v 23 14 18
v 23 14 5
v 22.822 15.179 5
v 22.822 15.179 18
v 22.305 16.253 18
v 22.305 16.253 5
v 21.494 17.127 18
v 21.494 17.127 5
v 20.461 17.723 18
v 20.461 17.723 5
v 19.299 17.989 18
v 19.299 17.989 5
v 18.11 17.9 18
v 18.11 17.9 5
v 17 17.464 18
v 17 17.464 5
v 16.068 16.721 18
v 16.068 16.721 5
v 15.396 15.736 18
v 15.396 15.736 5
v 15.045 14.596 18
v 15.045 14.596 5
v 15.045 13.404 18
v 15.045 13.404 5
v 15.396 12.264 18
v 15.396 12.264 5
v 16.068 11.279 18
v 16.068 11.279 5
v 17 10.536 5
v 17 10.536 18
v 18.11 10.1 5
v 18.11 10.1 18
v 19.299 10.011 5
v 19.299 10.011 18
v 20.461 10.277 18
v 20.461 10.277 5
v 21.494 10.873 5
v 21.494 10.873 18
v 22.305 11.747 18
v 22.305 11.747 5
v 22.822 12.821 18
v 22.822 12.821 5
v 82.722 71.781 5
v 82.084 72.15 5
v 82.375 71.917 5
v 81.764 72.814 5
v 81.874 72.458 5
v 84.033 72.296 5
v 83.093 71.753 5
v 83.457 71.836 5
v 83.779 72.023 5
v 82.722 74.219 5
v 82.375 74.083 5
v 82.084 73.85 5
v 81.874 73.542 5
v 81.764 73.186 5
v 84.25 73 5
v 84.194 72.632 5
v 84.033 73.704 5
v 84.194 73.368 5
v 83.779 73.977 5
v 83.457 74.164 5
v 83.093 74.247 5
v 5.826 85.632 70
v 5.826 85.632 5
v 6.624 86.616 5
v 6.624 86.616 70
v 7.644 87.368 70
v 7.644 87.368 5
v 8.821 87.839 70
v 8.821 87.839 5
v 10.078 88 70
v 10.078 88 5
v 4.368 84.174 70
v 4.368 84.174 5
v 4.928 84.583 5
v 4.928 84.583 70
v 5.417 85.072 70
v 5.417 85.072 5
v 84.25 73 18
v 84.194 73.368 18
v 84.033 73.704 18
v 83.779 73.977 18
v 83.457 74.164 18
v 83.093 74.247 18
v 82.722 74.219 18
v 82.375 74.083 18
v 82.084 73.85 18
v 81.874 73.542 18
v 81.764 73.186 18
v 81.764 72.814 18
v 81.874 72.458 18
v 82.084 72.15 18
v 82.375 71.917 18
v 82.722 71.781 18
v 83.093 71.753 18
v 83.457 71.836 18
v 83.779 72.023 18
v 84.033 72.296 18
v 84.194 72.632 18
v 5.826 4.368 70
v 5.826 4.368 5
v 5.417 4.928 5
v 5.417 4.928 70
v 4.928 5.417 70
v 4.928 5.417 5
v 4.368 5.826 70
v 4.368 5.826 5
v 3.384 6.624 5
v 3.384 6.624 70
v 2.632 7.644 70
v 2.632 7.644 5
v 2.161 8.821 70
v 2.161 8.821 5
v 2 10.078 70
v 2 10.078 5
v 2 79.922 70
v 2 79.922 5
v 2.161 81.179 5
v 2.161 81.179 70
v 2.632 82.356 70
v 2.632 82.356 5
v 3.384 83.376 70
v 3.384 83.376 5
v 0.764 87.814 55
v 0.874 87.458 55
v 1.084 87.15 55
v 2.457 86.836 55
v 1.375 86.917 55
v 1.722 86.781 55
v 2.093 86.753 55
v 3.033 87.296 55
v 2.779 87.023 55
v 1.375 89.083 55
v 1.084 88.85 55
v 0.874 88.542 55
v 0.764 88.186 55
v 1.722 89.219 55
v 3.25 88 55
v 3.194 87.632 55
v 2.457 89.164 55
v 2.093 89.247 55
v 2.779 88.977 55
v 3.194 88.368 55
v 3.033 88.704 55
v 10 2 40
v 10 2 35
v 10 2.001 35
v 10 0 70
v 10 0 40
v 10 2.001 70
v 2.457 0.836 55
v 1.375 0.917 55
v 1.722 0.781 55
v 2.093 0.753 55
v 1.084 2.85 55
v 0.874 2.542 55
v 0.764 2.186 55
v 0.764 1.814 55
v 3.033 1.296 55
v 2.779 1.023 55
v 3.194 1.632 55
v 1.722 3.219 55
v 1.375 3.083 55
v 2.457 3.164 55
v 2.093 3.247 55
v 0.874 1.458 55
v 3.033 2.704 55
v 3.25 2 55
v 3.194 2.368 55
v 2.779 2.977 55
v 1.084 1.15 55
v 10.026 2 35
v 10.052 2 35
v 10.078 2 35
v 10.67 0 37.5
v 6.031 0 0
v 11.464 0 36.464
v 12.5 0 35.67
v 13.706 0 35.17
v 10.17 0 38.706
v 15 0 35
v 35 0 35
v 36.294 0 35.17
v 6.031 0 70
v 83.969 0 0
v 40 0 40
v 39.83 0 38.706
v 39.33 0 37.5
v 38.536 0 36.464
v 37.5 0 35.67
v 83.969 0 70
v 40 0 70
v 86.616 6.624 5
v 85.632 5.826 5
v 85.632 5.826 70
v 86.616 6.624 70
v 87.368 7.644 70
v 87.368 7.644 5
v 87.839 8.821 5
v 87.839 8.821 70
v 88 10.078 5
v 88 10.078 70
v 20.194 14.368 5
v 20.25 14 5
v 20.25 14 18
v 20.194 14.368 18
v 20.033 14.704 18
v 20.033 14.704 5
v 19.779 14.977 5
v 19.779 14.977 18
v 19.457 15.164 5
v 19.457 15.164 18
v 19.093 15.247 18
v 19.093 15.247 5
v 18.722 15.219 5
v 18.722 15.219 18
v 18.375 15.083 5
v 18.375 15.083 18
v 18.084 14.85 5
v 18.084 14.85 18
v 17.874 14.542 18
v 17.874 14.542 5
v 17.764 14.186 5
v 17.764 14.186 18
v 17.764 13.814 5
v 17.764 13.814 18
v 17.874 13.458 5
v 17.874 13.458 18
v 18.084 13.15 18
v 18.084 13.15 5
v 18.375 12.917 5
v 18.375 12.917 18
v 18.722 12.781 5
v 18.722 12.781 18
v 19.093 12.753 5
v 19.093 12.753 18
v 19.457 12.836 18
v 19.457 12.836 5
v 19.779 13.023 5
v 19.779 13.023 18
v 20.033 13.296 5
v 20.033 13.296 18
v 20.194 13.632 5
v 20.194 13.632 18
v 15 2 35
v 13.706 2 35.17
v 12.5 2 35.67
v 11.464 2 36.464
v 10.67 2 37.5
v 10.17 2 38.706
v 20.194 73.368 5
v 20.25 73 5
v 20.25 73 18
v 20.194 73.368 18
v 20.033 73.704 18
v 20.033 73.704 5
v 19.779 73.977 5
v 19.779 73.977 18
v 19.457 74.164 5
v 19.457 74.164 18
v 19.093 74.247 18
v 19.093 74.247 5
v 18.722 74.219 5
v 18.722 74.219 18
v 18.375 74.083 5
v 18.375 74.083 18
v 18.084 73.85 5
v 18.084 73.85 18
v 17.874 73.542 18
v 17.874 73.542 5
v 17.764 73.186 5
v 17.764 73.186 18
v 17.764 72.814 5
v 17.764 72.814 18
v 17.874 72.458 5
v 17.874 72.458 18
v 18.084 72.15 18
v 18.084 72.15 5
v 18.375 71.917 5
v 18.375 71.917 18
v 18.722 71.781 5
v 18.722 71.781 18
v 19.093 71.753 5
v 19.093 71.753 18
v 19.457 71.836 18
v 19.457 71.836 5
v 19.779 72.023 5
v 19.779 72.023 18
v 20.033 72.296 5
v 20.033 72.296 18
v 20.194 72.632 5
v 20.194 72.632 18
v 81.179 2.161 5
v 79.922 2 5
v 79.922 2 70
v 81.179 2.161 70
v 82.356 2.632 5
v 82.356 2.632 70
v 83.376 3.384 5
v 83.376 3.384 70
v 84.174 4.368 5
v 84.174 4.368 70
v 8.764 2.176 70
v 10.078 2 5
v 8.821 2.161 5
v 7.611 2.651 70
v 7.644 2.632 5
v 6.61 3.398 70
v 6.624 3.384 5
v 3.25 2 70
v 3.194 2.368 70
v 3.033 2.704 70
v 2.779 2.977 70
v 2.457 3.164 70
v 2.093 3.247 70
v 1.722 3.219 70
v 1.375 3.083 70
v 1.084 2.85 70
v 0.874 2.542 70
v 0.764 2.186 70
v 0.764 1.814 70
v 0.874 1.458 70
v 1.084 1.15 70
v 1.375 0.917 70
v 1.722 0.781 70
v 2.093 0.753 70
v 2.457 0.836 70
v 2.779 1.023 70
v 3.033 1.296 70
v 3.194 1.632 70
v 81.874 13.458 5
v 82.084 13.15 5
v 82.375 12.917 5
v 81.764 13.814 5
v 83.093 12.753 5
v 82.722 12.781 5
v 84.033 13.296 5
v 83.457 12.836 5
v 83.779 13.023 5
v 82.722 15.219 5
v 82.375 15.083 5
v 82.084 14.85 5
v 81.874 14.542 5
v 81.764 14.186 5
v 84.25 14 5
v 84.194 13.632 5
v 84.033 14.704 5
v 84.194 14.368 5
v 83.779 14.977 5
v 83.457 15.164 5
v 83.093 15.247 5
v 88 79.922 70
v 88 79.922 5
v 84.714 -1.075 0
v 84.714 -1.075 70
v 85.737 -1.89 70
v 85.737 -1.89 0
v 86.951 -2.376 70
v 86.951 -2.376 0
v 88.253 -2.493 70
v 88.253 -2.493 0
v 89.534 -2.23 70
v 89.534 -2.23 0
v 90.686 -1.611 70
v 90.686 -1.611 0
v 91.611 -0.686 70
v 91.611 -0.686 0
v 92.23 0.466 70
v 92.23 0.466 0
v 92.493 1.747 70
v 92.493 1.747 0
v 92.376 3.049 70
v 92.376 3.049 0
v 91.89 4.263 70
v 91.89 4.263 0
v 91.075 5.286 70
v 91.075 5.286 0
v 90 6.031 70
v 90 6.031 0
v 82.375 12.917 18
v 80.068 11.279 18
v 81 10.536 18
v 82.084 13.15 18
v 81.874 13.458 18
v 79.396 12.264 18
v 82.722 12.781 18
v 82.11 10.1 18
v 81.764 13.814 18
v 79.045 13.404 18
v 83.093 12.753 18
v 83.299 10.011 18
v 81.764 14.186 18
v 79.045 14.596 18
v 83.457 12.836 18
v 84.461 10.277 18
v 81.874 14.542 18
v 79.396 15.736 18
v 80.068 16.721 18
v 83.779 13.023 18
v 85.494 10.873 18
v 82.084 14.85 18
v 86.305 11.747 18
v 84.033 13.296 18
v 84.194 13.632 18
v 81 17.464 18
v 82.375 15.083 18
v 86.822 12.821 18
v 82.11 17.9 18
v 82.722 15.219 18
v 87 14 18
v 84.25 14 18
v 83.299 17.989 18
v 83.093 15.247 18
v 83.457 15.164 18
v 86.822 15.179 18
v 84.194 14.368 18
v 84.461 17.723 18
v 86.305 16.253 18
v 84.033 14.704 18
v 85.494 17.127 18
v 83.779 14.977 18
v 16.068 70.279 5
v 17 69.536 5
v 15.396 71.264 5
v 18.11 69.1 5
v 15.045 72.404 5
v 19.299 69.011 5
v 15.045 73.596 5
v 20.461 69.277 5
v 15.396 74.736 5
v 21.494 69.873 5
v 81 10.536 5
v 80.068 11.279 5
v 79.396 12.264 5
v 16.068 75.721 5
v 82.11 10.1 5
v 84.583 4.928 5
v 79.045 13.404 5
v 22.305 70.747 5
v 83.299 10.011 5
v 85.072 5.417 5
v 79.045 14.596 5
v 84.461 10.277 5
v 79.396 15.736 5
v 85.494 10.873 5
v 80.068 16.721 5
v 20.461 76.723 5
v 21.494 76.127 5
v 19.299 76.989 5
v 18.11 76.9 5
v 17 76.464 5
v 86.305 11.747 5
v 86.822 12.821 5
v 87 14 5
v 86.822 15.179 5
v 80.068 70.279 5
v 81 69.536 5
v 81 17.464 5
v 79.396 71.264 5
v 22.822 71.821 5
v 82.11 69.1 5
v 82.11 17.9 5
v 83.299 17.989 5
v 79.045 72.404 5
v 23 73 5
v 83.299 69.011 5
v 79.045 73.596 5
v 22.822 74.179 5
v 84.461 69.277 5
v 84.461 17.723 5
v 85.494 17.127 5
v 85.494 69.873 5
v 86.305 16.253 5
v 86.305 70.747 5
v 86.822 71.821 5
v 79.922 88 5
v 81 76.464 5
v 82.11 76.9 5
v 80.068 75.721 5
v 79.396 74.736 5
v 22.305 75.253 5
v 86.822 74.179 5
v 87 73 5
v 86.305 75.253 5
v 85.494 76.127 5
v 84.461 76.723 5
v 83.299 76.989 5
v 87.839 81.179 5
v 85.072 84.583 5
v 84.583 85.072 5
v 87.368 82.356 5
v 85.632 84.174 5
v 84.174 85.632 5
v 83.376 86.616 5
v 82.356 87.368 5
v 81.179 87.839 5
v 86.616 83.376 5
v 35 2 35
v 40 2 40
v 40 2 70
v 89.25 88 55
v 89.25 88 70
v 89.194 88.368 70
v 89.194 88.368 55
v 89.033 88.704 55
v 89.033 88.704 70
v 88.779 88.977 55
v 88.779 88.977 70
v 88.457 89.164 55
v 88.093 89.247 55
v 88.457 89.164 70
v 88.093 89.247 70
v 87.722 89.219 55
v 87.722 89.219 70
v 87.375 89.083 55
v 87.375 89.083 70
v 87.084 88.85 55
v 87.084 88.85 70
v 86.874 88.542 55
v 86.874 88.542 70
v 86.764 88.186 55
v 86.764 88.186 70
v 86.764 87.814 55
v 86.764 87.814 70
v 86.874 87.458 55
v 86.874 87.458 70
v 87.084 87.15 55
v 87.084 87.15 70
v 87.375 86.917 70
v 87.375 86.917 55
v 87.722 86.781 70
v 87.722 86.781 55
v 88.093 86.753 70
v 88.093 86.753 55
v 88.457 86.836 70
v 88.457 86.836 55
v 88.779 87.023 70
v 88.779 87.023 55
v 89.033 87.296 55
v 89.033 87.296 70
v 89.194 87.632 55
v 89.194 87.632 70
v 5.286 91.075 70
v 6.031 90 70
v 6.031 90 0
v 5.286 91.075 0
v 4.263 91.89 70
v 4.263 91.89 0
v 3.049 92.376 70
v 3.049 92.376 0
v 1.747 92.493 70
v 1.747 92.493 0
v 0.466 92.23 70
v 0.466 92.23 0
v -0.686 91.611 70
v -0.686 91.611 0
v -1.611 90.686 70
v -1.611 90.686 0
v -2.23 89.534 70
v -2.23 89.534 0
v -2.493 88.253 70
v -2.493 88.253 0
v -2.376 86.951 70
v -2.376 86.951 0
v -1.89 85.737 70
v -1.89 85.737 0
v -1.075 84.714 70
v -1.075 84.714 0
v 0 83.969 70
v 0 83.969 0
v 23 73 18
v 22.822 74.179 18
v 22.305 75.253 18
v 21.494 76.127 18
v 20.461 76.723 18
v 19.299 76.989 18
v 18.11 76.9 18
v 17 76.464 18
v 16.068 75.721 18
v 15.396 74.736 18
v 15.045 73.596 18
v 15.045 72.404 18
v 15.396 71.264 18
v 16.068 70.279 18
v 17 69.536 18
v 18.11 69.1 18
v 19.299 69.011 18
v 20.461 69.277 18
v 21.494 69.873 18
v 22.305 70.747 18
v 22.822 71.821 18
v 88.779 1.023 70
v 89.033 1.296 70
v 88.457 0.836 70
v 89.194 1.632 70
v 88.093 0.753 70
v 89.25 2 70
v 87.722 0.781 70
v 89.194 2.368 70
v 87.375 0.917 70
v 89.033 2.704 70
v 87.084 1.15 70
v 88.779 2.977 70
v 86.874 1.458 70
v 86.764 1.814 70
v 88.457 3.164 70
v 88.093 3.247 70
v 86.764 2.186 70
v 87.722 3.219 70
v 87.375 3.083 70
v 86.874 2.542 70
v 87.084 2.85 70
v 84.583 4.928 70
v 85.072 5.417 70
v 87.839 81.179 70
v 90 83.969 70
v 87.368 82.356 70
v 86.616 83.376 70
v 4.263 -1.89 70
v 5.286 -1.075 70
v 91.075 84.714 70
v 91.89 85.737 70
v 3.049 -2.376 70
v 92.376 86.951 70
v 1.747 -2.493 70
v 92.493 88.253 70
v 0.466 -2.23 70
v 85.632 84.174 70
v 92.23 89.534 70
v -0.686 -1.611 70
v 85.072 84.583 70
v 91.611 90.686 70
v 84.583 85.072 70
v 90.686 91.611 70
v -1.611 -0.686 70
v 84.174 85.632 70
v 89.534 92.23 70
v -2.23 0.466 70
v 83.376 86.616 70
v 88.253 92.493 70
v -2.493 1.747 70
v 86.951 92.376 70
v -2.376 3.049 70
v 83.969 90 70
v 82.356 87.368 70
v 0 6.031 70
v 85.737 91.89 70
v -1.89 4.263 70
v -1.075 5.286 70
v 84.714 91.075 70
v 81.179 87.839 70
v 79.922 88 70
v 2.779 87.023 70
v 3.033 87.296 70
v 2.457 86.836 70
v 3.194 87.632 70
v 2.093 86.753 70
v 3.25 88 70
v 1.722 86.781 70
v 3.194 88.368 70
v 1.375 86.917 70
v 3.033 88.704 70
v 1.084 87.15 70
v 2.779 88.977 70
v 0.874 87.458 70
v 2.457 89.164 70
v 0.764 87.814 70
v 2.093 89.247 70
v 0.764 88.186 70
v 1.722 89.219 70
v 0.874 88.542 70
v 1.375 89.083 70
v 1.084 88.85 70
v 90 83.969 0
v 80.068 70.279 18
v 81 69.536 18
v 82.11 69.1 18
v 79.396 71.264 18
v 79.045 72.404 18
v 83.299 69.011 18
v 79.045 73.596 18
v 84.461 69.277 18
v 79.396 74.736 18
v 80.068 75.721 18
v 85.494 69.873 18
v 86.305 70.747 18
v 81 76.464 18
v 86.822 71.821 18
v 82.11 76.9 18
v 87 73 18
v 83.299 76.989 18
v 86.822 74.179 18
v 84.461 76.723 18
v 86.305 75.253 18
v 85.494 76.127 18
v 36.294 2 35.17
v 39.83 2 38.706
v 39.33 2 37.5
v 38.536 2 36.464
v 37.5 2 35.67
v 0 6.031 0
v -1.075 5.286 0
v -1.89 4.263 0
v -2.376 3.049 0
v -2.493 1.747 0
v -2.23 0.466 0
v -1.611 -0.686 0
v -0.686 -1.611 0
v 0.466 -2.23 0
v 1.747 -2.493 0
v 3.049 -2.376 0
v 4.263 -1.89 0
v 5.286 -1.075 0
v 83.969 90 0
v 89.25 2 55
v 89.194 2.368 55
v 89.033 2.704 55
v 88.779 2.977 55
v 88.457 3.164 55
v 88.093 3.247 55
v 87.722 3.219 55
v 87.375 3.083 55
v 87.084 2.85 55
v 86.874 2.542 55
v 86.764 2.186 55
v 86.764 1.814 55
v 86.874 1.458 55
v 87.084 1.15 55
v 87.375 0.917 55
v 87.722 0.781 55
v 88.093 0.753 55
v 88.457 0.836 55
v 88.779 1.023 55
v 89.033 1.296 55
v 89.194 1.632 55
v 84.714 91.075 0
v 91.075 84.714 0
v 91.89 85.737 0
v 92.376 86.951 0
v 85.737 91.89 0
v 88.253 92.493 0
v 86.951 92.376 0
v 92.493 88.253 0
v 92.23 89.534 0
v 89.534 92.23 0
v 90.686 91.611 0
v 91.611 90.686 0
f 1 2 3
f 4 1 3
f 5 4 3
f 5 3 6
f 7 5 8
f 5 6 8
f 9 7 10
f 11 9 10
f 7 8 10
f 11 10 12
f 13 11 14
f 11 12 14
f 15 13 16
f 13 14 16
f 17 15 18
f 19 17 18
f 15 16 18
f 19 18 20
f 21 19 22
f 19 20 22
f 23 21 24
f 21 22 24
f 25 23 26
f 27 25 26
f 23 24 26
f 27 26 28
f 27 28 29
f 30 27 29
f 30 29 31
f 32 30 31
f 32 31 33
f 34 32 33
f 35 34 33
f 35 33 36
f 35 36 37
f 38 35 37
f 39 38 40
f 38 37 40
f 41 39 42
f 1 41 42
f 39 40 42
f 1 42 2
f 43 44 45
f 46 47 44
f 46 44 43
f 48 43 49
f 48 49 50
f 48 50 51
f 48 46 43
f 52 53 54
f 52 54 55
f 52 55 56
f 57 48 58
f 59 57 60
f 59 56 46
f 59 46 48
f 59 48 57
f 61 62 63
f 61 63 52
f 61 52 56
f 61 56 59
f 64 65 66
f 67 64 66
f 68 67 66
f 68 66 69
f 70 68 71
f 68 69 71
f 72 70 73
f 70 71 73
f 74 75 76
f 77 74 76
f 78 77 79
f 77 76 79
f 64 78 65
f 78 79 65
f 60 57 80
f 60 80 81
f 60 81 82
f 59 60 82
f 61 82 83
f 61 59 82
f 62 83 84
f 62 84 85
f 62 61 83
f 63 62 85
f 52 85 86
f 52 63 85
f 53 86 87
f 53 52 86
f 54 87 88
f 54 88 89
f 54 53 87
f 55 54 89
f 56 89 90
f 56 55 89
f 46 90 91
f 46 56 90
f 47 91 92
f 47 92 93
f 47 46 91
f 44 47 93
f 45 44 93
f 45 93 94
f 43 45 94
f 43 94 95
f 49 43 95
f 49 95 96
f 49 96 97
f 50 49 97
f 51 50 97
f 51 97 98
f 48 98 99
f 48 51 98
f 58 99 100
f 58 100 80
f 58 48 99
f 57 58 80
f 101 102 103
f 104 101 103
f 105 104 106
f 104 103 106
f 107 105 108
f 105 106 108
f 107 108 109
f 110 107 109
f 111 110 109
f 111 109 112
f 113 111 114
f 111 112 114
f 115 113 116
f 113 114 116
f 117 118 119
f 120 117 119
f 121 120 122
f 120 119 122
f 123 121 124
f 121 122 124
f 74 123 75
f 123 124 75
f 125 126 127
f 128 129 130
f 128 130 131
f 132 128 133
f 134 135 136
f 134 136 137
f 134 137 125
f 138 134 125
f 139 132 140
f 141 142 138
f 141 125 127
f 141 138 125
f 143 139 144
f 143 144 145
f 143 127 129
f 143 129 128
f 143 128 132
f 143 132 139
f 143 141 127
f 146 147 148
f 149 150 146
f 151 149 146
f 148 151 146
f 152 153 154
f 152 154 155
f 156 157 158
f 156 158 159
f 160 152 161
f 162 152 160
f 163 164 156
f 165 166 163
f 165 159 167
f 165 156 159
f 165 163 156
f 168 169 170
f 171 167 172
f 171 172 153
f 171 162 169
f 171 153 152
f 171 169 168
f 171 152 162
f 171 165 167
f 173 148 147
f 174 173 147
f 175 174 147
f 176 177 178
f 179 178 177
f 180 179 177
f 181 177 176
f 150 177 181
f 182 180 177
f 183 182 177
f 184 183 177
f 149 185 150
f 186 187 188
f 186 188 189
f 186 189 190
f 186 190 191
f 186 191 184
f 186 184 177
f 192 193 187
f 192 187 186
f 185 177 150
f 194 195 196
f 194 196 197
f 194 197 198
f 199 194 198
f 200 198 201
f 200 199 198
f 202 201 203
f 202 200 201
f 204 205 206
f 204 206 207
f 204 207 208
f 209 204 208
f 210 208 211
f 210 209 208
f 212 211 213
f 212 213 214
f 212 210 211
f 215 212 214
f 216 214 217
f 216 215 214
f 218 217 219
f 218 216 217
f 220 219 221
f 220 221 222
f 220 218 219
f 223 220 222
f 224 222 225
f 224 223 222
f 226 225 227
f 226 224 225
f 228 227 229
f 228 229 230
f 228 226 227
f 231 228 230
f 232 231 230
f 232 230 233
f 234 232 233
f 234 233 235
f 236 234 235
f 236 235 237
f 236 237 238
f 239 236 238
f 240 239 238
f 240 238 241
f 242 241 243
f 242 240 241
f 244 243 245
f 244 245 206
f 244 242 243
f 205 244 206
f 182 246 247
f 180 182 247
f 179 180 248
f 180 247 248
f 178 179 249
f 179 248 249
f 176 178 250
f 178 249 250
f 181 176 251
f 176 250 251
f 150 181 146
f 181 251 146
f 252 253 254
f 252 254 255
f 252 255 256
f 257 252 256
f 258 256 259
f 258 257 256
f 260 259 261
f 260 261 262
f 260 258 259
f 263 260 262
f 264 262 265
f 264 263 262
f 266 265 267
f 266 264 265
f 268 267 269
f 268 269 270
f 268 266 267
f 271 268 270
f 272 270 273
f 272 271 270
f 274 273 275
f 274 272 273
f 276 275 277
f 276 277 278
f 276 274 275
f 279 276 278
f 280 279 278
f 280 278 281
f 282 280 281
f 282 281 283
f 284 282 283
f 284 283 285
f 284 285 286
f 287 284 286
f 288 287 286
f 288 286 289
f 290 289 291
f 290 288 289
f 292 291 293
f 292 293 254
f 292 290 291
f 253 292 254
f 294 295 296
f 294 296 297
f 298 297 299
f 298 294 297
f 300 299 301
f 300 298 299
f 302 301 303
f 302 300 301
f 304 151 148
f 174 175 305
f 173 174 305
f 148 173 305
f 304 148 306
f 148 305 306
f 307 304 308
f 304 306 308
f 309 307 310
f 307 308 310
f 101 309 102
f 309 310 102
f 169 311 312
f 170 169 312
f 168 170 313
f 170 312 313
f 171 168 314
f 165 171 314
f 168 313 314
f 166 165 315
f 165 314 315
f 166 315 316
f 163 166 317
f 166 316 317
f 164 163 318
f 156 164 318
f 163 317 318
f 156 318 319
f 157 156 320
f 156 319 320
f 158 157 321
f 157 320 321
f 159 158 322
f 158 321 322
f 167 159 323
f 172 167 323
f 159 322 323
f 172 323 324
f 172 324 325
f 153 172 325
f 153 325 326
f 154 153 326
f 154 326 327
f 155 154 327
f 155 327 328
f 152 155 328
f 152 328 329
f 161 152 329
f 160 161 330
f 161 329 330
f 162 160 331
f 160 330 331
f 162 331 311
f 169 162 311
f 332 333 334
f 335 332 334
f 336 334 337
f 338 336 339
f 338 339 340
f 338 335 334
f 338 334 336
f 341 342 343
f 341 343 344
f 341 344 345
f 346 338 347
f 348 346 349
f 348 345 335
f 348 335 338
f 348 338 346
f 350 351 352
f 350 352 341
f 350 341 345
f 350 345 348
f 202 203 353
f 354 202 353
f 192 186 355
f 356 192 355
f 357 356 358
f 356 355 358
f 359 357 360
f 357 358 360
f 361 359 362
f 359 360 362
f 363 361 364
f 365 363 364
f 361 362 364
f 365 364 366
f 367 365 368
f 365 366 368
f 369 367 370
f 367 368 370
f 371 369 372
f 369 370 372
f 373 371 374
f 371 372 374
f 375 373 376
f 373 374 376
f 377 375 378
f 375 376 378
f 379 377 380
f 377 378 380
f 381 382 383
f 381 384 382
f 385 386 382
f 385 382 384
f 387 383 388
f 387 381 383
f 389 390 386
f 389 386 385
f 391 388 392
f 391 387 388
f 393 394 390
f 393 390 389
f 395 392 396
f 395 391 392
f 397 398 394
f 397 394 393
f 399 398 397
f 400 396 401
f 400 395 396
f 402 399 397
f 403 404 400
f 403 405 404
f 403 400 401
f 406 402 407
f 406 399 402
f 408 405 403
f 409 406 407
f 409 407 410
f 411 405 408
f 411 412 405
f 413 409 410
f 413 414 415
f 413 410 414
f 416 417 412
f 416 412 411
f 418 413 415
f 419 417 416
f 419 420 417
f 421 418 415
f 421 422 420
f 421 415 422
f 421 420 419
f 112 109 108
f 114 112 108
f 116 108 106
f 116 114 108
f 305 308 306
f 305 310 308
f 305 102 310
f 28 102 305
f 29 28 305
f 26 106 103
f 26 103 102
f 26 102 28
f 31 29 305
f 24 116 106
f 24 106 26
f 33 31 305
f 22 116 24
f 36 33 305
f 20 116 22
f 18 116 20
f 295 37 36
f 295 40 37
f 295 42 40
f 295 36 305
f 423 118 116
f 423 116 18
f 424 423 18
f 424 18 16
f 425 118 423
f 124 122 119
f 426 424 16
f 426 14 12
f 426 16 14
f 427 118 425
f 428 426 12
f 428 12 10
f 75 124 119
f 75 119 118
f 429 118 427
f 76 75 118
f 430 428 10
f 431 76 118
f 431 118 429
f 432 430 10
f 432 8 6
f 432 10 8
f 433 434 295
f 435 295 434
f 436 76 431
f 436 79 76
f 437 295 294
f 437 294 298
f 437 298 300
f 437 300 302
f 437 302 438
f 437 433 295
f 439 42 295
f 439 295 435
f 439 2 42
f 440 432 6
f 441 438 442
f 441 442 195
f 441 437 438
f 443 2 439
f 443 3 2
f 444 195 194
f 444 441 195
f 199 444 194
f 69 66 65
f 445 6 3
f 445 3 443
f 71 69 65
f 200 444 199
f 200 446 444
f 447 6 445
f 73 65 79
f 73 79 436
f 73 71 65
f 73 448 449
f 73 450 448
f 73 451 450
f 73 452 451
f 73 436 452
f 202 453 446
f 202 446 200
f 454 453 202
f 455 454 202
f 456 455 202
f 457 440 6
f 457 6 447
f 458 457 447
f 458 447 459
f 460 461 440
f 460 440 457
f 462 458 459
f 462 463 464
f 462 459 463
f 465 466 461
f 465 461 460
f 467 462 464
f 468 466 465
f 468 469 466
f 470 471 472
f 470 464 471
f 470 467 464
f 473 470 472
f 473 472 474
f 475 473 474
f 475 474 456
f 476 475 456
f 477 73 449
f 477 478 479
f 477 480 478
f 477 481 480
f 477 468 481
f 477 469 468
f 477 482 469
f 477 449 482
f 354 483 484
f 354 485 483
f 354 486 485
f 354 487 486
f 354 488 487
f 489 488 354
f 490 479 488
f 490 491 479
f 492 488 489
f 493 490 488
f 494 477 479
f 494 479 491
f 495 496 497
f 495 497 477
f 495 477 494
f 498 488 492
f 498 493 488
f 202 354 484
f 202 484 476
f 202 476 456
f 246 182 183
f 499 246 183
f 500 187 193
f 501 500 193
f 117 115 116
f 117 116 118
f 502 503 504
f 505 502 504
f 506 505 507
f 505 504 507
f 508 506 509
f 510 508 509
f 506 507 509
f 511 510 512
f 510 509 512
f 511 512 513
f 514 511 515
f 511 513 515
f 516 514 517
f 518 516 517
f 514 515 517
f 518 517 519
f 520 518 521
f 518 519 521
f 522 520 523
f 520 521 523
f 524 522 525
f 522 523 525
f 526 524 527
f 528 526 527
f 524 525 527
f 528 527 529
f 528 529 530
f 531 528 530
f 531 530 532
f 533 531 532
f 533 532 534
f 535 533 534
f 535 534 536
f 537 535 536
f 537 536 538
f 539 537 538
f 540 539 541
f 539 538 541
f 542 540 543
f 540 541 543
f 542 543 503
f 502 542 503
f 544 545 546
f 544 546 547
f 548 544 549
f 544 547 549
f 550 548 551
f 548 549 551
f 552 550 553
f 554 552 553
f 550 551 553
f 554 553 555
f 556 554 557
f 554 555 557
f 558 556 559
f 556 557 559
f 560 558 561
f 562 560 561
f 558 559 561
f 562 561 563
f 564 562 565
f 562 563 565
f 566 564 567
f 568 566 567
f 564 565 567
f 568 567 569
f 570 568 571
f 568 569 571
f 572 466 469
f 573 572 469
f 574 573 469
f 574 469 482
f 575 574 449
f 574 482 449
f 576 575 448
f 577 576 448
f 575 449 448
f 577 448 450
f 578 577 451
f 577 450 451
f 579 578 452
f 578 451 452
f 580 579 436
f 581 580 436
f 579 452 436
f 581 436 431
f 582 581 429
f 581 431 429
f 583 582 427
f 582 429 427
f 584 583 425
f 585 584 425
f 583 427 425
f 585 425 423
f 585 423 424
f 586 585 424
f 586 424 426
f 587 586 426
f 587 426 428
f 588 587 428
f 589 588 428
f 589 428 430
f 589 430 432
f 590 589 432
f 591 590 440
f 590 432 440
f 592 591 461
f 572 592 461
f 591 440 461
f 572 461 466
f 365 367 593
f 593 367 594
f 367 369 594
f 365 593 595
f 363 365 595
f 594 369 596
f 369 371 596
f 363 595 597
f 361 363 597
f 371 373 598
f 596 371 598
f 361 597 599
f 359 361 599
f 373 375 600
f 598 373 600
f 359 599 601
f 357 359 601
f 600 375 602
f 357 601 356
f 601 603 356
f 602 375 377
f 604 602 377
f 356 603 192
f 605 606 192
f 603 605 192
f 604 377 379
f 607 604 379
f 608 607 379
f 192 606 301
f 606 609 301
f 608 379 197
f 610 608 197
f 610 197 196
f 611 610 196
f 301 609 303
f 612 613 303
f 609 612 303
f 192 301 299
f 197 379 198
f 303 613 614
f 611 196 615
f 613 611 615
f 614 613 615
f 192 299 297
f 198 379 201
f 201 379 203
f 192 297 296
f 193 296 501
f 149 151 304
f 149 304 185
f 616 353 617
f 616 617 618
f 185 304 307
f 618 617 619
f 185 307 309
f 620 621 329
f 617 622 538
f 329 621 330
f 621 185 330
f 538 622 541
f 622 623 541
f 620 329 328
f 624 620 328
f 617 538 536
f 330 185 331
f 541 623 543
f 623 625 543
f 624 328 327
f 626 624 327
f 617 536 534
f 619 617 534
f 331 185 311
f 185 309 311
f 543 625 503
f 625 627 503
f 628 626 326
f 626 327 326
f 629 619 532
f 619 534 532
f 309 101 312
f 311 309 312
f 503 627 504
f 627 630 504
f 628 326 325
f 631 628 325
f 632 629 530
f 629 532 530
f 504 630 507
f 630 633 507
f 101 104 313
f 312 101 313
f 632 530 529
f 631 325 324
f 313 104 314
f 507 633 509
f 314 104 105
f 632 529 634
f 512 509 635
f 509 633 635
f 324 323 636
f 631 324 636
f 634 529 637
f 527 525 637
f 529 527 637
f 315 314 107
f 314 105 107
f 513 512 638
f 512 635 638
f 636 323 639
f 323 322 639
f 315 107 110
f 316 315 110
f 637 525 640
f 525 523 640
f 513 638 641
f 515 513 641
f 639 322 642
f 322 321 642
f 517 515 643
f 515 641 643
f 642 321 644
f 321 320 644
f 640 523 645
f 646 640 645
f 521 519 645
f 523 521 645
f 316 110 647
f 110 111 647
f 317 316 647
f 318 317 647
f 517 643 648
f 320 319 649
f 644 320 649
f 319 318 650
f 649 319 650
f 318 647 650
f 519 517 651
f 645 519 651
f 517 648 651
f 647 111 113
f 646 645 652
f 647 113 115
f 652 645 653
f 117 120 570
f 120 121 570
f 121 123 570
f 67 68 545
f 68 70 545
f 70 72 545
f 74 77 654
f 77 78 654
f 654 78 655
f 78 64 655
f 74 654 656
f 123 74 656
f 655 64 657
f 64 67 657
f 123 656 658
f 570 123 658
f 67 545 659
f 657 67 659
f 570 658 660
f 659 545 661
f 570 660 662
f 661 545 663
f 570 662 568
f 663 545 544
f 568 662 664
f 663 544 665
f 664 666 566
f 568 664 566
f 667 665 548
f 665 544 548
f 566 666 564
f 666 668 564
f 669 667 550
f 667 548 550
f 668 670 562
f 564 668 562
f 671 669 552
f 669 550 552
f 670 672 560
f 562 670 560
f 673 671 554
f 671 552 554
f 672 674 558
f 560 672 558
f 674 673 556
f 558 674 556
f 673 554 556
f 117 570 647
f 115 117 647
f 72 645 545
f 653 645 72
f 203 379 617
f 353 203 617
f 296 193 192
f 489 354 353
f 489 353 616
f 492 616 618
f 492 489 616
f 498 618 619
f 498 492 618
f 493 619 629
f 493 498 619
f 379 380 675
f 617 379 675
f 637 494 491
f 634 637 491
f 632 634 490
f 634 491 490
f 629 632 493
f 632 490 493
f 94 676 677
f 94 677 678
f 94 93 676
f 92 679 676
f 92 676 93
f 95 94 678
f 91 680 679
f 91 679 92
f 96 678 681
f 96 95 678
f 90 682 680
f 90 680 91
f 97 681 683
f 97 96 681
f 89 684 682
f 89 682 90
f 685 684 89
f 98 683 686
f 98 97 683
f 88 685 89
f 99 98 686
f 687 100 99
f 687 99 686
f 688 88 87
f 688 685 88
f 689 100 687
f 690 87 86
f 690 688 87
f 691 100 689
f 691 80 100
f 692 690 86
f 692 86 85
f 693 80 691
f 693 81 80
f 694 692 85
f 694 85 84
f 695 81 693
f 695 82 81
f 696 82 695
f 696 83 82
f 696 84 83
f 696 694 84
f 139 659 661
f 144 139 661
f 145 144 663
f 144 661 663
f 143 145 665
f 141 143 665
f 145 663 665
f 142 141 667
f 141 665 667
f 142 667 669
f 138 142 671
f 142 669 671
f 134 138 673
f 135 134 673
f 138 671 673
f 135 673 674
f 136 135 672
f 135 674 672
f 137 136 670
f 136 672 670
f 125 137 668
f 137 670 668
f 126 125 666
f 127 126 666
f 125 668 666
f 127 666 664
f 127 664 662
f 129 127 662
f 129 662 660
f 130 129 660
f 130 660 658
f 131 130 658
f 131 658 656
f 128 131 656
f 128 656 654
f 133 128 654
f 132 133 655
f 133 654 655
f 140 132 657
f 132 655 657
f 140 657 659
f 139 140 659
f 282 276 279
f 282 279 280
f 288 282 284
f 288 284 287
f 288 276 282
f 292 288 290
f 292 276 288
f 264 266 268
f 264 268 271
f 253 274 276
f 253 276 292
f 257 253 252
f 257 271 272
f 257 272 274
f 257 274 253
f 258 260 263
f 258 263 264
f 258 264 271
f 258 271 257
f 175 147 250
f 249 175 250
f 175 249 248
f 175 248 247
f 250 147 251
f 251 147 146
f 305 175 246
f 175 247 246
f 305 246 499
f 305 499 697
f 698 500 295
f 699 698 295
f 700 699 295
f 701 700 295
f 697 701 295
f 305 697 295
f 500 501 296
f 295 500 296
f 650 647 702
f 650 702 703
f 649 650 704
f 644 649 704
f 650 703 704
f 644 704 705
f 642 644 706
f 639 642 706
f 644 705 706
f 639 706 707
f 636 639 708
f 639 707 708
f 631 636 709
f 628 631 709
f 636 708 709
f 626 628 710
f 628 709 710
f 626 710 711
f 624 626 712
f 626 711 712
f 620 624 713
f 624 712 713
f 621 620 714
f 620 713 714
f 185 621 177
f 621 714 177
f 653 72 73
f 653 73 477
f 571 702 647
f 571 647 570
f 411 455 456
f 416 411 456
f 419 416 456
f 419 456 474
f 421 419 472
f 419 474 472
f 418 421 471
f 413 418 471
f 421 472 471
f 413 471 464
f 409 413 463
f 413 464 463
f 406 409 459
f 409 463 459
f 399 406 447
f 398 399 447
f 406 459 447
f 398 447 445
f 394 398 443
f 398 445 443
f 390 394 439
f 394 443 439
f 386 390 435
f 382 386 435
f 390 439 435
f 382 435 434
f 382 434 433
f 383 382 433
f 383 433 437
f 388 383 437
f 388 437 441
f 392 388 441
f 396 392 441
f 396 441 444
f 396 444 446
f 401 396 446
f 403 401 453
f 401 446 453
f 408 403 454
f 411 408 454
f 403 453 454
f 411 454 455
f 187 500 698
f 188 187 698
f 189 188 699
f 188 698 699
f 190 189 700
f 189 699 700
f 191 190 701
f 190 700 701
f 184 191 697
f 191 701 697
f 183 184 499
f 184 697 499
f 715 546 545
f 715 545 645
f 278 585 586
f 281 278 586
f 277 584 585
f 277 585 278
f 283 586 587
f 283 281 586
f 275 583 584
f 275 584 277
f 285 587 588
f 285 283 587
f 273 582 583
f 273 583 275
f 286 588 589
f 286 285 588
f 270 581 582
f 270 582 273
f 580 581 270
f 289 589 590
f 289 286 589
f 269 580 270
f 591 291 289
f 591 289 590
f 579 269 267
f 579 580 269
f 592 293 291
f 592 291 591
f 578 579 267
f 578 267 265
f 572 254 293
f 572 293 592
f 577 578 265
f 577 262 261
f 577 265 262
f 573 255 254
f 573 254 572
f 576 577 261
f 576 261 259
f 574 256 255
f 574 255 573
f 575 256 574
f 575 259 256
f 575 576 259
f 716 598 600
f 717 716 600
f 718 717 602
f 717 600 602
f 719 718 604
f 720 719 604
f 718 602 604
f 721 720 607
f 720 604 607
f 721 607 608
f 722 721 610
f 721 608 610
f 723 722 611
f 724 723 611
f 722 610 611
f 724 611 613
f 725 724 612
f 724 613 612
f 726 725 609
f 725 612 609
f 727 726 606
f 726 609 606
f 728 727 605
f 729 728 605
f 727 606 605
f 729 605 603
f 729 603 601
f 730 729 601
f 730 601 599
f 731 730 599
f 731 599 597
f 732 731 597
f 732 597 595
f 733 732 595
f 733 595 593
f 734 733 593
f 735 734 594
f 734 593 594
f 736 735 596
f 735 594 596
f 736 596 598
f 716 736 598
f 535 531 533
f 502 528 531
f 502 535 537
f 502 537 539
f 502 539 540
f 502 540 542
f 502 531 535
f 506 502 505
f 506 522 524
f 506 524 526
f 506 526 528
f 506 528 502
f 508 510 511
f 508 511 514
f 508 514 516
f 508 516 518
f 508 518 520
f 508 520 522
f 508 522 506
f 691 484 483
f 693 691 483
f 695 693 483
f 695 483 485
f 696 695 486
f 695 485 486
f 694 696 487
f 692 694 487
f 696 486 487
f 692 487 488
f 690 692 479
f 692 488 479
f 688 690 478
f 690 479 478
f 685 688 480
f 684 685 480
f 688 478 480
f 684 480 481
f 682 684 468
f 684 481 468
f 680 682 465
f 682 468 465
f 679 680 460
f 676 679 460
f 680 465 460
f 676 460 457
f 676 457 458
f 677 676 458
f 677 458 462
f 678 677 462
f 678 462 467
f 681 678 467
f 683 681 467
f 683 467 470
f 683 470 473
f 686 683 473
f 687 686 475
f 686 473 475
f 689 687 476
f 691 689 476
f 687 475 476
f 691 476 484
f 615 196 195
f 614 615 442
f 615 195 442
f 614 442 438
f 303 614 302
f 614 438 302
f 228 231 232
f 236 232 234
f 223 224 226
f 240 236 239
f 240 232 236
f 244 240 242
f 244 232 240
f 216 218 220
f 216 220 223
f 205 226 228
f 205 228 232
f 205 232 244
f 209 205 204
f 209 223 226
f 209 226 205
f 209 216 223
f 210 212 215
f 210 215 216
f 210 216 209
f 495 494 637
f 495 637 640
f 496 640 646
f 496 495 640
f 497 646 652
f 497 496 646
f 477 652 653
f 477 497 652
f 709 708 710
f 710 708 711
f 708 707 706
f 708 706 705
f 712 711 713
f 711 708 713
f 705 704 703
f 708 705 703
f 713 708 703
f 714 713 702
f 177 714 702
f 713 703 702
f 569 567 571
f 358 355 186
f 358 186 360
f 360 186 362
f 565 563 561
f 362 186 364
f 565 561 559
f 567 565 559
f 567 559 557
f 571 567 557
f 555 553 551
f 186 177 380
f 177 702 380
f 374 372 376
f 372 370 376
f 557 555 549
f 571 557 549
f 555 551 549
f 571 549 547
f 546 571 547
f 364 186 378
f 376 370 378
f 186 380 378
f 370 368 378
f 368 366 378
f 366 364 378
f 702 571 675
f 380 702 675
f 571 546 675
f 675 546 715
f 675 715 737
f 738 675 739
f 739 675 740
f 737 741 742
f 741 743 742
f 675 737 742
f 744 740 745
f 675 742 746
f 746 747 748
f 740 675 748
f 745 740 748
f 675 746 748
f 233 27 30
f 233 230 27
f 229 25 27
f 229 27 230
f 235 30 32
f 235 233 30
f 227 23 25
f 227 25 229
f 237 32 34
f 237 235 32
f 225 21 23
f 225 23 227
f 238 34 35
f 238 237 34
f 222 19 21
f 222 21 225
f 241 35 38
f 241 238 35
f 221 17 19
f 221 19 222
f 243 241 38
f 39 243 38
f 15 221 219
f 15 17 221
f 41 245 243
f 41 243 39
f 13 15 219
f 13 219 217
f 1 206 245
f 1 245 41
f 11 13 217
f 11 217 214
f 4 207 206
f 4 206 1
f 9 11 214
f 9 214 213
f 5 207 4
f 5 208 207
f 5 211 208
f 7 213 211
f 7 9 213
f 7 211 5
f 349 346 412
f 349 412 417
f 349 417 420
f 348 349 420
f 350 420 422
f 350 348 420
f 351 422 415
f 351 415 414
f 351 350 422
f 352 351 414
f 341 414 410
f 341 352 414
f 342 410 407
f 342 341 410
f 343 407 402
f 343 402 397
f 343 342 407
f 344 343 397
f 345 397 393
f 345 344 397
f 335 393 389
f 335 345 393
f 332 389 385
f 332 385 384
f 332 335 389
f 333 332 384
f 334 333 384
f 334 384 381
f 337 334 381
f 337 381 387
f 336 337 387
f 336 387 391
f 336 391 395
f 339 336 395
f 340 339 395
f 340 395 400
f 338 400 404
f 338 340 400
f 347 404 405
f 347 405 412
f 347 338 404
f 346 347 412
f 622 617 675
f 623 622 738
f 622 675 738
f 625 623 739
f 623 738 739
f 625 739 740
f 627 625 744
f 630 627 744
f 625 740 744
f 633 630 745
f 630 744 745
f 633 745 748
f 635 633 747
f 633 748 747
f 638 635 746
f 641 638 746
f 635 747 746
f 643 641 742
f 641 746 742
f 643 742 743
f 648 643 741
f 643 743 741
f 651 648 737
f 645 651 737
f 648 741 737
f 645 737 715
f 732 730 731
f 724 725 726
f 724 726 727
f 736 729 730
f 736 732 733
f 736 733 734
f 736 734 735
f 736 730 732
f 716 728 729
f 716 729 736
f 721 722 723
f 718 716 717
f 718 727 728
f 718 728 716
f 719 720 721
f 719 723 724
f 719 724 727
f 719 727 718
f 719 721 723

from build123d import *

# Parameters (mm, degrees)
F0_W          = 90
F0_H          = 90
F1_DEPTH      = 70
F2_W          = 86
F2_H          = 86
F3_DEPTH      = 65
F4_R          = 4.5
F5_DEPTH      = 70
F6_W          = 30
F6_H          = 35
F7_DEPTH      = 2
F8_R          = 1.25
F9_DEPTH      = 15
F10_R         = 4
F10_R_2       = 1.25
F11_DEPTH     = 13
F12_T1_DEPTH  = 2
F12_T3_DEPTH  = 65
F12_T8_DEPTH  = 73.9443680268
F12_T13_DEPTH = 65


# Not quite as in the source:
# - a fillet or chamfer that OpenCascade refuses, or shapes differently, is made with other operations: its cross-section is extruded or revolved along the edge and cut away or added
# - a feature of the source that left no trace in its solid (it failed there, or was rolled back) is left out


with BuildPart() as f1:
    # F0 (on Top) → F1 (new body)
    with BuildSketch(Plane.XY):
        with Locations((45, 45)):
            Rectangle(F0_W, F0_H)
    extrude(amount=F1_DEPTH)

    # F2 (on face) → F3 (cut)
    with BuildSketch(Plane.XY.offset(70)):
        with Locations((45, 45)):
            Rectangle(F2_W, F2_H)
    extrude(amount=-F3_DEPTH, mode=Mode.SUBTRACT)

    # F4 (on Top) → F5 (join)
    with BuildSketch(Plane.XY):
        with Locations((2, 88)):
            Circle(F4_R)
        with Locations((88, 88)):
            Circle(F4_R)
        with Locations((2, 2)):
            Circle(F4_R)
        with Locations((88, 2)):
            Circle(F4_R)
    extrude(amount=F5_DEPTH)

    # F6 (on Front) → F7 (cut, through all)
    with BuildSketch(Plane.XZ):
        with Locations((25, 52.5)):
            Rectangle(F6_W, F6_H)
    extrude(amount=-F7_DEPTH, mode=Mode.SUBTRACT)

    # F8 (on face) → F9 (cut)
    with BuildSketch(Plane.XY.offset(70)):
        with Locations((2, 88)):
            Circle(F8_R)
        with Locations((88, 88)):
            Circle(F8_R)
        with Locations((2, 2)):
            Circle(F8_R)
        with Locations((88, 2)):
            Circle(F8_R)
    extrude(amount=-F9_DEPTH, mode=Mode.SUBTRACT)

    # F10 (on face) → F11 (join)
    with BuildSketch(Plane.XY.offset(5)):
        with Locations((19, 73)):
            Circle(F10_R)
        with Locations((19, 73)):
            Circle(F10_R_2, mode=Mode.SUBTRACT)
        with Locations((83, 73)):
            Circle(F10_R)
        with Locations((83, 73)):
            Circle(F10_R_2, mode=Mode.SUBTRACT)
        with Locations((83, 14)):
            Circle(F10_R)
        with Locations((83, 14)):
            Circle(F10_R_2, mode=Mode.SUBTRACT)
        with Locations((19, 14)):
            Circle(F10_R)
        with Locations((19, 14)):
            Circle(F10_R_2, mode=Mode.SUBTRACT)
    extrude(amount=F11_DEPTH)

    # F12: fillet of radius 5 on 10 edges, made by hand

    # F12_s2 → F12_t1 (join)
    with BuildSketch(Plane.XZ.offset(-2)):
        with BuildLine():
            ThreePointArc((40, 40), (38.5355339059, 36.4644660941), (35, 35))
            Line((35, 35), (40, 35))
            Line((40, 35), (40, 40))
        make_face()
        with BuildLine():
            ThreePointArc((15, 35), (11.4644660941, 36.4644660941), (10, 40))
            Line((10, 40), (10, 35))
            Line((10, 35), (15, 35))
        make_face()
    extrude(amount=F12_T1_DEPTH)

    # F12_s4 → F12_t3 (join)
    with BuildSketch(Plane.XY.offset(5)):
        with BuildLine():
            ThreePointArc((79.9222527893, 2), (82.3555741063, 2.6320545598), (84.1736986897, 4.3684210526))
            ThreePointArc((84.1736986897, 4.3684210526), (83.6717003398, 3.2311872529), (83.5, 2))
            Line((83.5, 2), (79.9222527893, 2))
        make_face()
        with BuildLine():
            ThreePointArc((85.6315789474, 5.8263013103), (87.3679454402, 7.6444258937), (88, 10.0777472107))
            Line((88, 10.0777472107), (88, 6.5))
            ThreePointArc((88, 6.5), (86.7688127471, 6.3282996602), (85.6315789474, 5.8263013103))
        make_face()
        with BuildLine():
            ThreePointArc((4.3684210526, 5.8263013103), (2.6320545598, 7.6444258937), (2, 10.0777472107))
            Line((2, 10.0777472107), (2, 6.5))
            ThreePointArc((2, 6.5), (3.2311872529, 6.3282996602), (4.3684210526, 5.8263013103))
        make_face()
        with BuildLine():
            ThreePointArc((88, 79.9222527893), (87.3679454402, 82.3555741063), (85.6315789474, 84.1736986897))
            ThreePointArc((85.6315789474, 84.1736986897), (86.7688127471, 83.6717003398), (88, 83.5))
            Line((88, 83.5), (88, 79.9222527893))
        make_face()
        with BuildLine():
            ThreePointArc((2, 79.9222527893), (2.6320545598, 82.3555741063), (4.3684210526, 84.1736986897))
            ThreePointArc((4.3684210526, 84.1736986897), (3.2311872529, 83.6717003398), (2, 83.5))
            Line((2, 83.5), (2, 79.9222527893))
        make_face()
        with BuildLine():
            ThreePointArc((84.1736986897, 85.6315789474), (82.3555741063, 87.3679454402), (79.9222527893, 88))
            Line((79.9222527893, 88), (83.5, 88))
            ThreePointArc((83.5, 88), (83.6717003398, 86.7688127471), (84.1736986897, 85.6315789474))
        make_face()
        with BuildLine():
            ThreePointArc((5.8263013103, 85.6315789474), (7.6444258937, 87.3679454402), (10.0777472107, 88))
            Line((10.0777472107, 88), (6.5, 88))
            ThreePointArc((6.5, 88), (6.3282996602, 86.7688127471), (5.8263013103, 85.6315789474))
        make_face()
    extrude(amount=F12_T3_DEPTH)


with BuildPart() as f12_tool6:
    # F12_s7 → F12_t8 (new body)
    with BuildSketch(Plane.XY.offset(5)):
        with BuildLine():
            ThreePointArc((10.0777472107, 2), (7.6444258937, 2.6320545598), (5.8263013103, 4.3684210526))
            ThreePointArc((5.8263013103, 4.3684210526), (6.3282996602, 3.2311872529), (6.5, 2))
            Line((6.5, 2), (10.0777472107, 2))
        make_face()
    extrude(amount=F12_T8_DEPTH)

    split(bisect_by=Plane.XY.offset(35), keep=Keep.BOTTOM)


with BuildPart() as f1_1:
    add(f1.part)

    # F12_t5: union F12_tool6
    add(f12_tool6.part)


with BuildPart() as f12_tool11:
    # F12_s12 → F12_t13 (new body)
    with BuildSketch(Plane.XY.offset(5)):
        with BuildLine():
            ThreePointArc((10.0777472107, 2), (7.6444258937, 2.6320545598), (5.8263013103, 4.3684210526))
            ThreePointArc((5.8263013103, 4.3684210526), (6.3282996602, 3.2311872529), (6.5, 2))
            Line((6.5, 2), (10.0777472107, 2))
        make_face()
    extrude(amount=F12_T13_DEPTH)

    split(bisect_by=Plane.YZ.offset(10), keep=Keep.BOTTOM)


with BuildPart() as f1_2:
    add(f1_1.part)

    # F12_t10: union F12_tool11
    add(f12_tool11.part)


solid = f1_2.part
